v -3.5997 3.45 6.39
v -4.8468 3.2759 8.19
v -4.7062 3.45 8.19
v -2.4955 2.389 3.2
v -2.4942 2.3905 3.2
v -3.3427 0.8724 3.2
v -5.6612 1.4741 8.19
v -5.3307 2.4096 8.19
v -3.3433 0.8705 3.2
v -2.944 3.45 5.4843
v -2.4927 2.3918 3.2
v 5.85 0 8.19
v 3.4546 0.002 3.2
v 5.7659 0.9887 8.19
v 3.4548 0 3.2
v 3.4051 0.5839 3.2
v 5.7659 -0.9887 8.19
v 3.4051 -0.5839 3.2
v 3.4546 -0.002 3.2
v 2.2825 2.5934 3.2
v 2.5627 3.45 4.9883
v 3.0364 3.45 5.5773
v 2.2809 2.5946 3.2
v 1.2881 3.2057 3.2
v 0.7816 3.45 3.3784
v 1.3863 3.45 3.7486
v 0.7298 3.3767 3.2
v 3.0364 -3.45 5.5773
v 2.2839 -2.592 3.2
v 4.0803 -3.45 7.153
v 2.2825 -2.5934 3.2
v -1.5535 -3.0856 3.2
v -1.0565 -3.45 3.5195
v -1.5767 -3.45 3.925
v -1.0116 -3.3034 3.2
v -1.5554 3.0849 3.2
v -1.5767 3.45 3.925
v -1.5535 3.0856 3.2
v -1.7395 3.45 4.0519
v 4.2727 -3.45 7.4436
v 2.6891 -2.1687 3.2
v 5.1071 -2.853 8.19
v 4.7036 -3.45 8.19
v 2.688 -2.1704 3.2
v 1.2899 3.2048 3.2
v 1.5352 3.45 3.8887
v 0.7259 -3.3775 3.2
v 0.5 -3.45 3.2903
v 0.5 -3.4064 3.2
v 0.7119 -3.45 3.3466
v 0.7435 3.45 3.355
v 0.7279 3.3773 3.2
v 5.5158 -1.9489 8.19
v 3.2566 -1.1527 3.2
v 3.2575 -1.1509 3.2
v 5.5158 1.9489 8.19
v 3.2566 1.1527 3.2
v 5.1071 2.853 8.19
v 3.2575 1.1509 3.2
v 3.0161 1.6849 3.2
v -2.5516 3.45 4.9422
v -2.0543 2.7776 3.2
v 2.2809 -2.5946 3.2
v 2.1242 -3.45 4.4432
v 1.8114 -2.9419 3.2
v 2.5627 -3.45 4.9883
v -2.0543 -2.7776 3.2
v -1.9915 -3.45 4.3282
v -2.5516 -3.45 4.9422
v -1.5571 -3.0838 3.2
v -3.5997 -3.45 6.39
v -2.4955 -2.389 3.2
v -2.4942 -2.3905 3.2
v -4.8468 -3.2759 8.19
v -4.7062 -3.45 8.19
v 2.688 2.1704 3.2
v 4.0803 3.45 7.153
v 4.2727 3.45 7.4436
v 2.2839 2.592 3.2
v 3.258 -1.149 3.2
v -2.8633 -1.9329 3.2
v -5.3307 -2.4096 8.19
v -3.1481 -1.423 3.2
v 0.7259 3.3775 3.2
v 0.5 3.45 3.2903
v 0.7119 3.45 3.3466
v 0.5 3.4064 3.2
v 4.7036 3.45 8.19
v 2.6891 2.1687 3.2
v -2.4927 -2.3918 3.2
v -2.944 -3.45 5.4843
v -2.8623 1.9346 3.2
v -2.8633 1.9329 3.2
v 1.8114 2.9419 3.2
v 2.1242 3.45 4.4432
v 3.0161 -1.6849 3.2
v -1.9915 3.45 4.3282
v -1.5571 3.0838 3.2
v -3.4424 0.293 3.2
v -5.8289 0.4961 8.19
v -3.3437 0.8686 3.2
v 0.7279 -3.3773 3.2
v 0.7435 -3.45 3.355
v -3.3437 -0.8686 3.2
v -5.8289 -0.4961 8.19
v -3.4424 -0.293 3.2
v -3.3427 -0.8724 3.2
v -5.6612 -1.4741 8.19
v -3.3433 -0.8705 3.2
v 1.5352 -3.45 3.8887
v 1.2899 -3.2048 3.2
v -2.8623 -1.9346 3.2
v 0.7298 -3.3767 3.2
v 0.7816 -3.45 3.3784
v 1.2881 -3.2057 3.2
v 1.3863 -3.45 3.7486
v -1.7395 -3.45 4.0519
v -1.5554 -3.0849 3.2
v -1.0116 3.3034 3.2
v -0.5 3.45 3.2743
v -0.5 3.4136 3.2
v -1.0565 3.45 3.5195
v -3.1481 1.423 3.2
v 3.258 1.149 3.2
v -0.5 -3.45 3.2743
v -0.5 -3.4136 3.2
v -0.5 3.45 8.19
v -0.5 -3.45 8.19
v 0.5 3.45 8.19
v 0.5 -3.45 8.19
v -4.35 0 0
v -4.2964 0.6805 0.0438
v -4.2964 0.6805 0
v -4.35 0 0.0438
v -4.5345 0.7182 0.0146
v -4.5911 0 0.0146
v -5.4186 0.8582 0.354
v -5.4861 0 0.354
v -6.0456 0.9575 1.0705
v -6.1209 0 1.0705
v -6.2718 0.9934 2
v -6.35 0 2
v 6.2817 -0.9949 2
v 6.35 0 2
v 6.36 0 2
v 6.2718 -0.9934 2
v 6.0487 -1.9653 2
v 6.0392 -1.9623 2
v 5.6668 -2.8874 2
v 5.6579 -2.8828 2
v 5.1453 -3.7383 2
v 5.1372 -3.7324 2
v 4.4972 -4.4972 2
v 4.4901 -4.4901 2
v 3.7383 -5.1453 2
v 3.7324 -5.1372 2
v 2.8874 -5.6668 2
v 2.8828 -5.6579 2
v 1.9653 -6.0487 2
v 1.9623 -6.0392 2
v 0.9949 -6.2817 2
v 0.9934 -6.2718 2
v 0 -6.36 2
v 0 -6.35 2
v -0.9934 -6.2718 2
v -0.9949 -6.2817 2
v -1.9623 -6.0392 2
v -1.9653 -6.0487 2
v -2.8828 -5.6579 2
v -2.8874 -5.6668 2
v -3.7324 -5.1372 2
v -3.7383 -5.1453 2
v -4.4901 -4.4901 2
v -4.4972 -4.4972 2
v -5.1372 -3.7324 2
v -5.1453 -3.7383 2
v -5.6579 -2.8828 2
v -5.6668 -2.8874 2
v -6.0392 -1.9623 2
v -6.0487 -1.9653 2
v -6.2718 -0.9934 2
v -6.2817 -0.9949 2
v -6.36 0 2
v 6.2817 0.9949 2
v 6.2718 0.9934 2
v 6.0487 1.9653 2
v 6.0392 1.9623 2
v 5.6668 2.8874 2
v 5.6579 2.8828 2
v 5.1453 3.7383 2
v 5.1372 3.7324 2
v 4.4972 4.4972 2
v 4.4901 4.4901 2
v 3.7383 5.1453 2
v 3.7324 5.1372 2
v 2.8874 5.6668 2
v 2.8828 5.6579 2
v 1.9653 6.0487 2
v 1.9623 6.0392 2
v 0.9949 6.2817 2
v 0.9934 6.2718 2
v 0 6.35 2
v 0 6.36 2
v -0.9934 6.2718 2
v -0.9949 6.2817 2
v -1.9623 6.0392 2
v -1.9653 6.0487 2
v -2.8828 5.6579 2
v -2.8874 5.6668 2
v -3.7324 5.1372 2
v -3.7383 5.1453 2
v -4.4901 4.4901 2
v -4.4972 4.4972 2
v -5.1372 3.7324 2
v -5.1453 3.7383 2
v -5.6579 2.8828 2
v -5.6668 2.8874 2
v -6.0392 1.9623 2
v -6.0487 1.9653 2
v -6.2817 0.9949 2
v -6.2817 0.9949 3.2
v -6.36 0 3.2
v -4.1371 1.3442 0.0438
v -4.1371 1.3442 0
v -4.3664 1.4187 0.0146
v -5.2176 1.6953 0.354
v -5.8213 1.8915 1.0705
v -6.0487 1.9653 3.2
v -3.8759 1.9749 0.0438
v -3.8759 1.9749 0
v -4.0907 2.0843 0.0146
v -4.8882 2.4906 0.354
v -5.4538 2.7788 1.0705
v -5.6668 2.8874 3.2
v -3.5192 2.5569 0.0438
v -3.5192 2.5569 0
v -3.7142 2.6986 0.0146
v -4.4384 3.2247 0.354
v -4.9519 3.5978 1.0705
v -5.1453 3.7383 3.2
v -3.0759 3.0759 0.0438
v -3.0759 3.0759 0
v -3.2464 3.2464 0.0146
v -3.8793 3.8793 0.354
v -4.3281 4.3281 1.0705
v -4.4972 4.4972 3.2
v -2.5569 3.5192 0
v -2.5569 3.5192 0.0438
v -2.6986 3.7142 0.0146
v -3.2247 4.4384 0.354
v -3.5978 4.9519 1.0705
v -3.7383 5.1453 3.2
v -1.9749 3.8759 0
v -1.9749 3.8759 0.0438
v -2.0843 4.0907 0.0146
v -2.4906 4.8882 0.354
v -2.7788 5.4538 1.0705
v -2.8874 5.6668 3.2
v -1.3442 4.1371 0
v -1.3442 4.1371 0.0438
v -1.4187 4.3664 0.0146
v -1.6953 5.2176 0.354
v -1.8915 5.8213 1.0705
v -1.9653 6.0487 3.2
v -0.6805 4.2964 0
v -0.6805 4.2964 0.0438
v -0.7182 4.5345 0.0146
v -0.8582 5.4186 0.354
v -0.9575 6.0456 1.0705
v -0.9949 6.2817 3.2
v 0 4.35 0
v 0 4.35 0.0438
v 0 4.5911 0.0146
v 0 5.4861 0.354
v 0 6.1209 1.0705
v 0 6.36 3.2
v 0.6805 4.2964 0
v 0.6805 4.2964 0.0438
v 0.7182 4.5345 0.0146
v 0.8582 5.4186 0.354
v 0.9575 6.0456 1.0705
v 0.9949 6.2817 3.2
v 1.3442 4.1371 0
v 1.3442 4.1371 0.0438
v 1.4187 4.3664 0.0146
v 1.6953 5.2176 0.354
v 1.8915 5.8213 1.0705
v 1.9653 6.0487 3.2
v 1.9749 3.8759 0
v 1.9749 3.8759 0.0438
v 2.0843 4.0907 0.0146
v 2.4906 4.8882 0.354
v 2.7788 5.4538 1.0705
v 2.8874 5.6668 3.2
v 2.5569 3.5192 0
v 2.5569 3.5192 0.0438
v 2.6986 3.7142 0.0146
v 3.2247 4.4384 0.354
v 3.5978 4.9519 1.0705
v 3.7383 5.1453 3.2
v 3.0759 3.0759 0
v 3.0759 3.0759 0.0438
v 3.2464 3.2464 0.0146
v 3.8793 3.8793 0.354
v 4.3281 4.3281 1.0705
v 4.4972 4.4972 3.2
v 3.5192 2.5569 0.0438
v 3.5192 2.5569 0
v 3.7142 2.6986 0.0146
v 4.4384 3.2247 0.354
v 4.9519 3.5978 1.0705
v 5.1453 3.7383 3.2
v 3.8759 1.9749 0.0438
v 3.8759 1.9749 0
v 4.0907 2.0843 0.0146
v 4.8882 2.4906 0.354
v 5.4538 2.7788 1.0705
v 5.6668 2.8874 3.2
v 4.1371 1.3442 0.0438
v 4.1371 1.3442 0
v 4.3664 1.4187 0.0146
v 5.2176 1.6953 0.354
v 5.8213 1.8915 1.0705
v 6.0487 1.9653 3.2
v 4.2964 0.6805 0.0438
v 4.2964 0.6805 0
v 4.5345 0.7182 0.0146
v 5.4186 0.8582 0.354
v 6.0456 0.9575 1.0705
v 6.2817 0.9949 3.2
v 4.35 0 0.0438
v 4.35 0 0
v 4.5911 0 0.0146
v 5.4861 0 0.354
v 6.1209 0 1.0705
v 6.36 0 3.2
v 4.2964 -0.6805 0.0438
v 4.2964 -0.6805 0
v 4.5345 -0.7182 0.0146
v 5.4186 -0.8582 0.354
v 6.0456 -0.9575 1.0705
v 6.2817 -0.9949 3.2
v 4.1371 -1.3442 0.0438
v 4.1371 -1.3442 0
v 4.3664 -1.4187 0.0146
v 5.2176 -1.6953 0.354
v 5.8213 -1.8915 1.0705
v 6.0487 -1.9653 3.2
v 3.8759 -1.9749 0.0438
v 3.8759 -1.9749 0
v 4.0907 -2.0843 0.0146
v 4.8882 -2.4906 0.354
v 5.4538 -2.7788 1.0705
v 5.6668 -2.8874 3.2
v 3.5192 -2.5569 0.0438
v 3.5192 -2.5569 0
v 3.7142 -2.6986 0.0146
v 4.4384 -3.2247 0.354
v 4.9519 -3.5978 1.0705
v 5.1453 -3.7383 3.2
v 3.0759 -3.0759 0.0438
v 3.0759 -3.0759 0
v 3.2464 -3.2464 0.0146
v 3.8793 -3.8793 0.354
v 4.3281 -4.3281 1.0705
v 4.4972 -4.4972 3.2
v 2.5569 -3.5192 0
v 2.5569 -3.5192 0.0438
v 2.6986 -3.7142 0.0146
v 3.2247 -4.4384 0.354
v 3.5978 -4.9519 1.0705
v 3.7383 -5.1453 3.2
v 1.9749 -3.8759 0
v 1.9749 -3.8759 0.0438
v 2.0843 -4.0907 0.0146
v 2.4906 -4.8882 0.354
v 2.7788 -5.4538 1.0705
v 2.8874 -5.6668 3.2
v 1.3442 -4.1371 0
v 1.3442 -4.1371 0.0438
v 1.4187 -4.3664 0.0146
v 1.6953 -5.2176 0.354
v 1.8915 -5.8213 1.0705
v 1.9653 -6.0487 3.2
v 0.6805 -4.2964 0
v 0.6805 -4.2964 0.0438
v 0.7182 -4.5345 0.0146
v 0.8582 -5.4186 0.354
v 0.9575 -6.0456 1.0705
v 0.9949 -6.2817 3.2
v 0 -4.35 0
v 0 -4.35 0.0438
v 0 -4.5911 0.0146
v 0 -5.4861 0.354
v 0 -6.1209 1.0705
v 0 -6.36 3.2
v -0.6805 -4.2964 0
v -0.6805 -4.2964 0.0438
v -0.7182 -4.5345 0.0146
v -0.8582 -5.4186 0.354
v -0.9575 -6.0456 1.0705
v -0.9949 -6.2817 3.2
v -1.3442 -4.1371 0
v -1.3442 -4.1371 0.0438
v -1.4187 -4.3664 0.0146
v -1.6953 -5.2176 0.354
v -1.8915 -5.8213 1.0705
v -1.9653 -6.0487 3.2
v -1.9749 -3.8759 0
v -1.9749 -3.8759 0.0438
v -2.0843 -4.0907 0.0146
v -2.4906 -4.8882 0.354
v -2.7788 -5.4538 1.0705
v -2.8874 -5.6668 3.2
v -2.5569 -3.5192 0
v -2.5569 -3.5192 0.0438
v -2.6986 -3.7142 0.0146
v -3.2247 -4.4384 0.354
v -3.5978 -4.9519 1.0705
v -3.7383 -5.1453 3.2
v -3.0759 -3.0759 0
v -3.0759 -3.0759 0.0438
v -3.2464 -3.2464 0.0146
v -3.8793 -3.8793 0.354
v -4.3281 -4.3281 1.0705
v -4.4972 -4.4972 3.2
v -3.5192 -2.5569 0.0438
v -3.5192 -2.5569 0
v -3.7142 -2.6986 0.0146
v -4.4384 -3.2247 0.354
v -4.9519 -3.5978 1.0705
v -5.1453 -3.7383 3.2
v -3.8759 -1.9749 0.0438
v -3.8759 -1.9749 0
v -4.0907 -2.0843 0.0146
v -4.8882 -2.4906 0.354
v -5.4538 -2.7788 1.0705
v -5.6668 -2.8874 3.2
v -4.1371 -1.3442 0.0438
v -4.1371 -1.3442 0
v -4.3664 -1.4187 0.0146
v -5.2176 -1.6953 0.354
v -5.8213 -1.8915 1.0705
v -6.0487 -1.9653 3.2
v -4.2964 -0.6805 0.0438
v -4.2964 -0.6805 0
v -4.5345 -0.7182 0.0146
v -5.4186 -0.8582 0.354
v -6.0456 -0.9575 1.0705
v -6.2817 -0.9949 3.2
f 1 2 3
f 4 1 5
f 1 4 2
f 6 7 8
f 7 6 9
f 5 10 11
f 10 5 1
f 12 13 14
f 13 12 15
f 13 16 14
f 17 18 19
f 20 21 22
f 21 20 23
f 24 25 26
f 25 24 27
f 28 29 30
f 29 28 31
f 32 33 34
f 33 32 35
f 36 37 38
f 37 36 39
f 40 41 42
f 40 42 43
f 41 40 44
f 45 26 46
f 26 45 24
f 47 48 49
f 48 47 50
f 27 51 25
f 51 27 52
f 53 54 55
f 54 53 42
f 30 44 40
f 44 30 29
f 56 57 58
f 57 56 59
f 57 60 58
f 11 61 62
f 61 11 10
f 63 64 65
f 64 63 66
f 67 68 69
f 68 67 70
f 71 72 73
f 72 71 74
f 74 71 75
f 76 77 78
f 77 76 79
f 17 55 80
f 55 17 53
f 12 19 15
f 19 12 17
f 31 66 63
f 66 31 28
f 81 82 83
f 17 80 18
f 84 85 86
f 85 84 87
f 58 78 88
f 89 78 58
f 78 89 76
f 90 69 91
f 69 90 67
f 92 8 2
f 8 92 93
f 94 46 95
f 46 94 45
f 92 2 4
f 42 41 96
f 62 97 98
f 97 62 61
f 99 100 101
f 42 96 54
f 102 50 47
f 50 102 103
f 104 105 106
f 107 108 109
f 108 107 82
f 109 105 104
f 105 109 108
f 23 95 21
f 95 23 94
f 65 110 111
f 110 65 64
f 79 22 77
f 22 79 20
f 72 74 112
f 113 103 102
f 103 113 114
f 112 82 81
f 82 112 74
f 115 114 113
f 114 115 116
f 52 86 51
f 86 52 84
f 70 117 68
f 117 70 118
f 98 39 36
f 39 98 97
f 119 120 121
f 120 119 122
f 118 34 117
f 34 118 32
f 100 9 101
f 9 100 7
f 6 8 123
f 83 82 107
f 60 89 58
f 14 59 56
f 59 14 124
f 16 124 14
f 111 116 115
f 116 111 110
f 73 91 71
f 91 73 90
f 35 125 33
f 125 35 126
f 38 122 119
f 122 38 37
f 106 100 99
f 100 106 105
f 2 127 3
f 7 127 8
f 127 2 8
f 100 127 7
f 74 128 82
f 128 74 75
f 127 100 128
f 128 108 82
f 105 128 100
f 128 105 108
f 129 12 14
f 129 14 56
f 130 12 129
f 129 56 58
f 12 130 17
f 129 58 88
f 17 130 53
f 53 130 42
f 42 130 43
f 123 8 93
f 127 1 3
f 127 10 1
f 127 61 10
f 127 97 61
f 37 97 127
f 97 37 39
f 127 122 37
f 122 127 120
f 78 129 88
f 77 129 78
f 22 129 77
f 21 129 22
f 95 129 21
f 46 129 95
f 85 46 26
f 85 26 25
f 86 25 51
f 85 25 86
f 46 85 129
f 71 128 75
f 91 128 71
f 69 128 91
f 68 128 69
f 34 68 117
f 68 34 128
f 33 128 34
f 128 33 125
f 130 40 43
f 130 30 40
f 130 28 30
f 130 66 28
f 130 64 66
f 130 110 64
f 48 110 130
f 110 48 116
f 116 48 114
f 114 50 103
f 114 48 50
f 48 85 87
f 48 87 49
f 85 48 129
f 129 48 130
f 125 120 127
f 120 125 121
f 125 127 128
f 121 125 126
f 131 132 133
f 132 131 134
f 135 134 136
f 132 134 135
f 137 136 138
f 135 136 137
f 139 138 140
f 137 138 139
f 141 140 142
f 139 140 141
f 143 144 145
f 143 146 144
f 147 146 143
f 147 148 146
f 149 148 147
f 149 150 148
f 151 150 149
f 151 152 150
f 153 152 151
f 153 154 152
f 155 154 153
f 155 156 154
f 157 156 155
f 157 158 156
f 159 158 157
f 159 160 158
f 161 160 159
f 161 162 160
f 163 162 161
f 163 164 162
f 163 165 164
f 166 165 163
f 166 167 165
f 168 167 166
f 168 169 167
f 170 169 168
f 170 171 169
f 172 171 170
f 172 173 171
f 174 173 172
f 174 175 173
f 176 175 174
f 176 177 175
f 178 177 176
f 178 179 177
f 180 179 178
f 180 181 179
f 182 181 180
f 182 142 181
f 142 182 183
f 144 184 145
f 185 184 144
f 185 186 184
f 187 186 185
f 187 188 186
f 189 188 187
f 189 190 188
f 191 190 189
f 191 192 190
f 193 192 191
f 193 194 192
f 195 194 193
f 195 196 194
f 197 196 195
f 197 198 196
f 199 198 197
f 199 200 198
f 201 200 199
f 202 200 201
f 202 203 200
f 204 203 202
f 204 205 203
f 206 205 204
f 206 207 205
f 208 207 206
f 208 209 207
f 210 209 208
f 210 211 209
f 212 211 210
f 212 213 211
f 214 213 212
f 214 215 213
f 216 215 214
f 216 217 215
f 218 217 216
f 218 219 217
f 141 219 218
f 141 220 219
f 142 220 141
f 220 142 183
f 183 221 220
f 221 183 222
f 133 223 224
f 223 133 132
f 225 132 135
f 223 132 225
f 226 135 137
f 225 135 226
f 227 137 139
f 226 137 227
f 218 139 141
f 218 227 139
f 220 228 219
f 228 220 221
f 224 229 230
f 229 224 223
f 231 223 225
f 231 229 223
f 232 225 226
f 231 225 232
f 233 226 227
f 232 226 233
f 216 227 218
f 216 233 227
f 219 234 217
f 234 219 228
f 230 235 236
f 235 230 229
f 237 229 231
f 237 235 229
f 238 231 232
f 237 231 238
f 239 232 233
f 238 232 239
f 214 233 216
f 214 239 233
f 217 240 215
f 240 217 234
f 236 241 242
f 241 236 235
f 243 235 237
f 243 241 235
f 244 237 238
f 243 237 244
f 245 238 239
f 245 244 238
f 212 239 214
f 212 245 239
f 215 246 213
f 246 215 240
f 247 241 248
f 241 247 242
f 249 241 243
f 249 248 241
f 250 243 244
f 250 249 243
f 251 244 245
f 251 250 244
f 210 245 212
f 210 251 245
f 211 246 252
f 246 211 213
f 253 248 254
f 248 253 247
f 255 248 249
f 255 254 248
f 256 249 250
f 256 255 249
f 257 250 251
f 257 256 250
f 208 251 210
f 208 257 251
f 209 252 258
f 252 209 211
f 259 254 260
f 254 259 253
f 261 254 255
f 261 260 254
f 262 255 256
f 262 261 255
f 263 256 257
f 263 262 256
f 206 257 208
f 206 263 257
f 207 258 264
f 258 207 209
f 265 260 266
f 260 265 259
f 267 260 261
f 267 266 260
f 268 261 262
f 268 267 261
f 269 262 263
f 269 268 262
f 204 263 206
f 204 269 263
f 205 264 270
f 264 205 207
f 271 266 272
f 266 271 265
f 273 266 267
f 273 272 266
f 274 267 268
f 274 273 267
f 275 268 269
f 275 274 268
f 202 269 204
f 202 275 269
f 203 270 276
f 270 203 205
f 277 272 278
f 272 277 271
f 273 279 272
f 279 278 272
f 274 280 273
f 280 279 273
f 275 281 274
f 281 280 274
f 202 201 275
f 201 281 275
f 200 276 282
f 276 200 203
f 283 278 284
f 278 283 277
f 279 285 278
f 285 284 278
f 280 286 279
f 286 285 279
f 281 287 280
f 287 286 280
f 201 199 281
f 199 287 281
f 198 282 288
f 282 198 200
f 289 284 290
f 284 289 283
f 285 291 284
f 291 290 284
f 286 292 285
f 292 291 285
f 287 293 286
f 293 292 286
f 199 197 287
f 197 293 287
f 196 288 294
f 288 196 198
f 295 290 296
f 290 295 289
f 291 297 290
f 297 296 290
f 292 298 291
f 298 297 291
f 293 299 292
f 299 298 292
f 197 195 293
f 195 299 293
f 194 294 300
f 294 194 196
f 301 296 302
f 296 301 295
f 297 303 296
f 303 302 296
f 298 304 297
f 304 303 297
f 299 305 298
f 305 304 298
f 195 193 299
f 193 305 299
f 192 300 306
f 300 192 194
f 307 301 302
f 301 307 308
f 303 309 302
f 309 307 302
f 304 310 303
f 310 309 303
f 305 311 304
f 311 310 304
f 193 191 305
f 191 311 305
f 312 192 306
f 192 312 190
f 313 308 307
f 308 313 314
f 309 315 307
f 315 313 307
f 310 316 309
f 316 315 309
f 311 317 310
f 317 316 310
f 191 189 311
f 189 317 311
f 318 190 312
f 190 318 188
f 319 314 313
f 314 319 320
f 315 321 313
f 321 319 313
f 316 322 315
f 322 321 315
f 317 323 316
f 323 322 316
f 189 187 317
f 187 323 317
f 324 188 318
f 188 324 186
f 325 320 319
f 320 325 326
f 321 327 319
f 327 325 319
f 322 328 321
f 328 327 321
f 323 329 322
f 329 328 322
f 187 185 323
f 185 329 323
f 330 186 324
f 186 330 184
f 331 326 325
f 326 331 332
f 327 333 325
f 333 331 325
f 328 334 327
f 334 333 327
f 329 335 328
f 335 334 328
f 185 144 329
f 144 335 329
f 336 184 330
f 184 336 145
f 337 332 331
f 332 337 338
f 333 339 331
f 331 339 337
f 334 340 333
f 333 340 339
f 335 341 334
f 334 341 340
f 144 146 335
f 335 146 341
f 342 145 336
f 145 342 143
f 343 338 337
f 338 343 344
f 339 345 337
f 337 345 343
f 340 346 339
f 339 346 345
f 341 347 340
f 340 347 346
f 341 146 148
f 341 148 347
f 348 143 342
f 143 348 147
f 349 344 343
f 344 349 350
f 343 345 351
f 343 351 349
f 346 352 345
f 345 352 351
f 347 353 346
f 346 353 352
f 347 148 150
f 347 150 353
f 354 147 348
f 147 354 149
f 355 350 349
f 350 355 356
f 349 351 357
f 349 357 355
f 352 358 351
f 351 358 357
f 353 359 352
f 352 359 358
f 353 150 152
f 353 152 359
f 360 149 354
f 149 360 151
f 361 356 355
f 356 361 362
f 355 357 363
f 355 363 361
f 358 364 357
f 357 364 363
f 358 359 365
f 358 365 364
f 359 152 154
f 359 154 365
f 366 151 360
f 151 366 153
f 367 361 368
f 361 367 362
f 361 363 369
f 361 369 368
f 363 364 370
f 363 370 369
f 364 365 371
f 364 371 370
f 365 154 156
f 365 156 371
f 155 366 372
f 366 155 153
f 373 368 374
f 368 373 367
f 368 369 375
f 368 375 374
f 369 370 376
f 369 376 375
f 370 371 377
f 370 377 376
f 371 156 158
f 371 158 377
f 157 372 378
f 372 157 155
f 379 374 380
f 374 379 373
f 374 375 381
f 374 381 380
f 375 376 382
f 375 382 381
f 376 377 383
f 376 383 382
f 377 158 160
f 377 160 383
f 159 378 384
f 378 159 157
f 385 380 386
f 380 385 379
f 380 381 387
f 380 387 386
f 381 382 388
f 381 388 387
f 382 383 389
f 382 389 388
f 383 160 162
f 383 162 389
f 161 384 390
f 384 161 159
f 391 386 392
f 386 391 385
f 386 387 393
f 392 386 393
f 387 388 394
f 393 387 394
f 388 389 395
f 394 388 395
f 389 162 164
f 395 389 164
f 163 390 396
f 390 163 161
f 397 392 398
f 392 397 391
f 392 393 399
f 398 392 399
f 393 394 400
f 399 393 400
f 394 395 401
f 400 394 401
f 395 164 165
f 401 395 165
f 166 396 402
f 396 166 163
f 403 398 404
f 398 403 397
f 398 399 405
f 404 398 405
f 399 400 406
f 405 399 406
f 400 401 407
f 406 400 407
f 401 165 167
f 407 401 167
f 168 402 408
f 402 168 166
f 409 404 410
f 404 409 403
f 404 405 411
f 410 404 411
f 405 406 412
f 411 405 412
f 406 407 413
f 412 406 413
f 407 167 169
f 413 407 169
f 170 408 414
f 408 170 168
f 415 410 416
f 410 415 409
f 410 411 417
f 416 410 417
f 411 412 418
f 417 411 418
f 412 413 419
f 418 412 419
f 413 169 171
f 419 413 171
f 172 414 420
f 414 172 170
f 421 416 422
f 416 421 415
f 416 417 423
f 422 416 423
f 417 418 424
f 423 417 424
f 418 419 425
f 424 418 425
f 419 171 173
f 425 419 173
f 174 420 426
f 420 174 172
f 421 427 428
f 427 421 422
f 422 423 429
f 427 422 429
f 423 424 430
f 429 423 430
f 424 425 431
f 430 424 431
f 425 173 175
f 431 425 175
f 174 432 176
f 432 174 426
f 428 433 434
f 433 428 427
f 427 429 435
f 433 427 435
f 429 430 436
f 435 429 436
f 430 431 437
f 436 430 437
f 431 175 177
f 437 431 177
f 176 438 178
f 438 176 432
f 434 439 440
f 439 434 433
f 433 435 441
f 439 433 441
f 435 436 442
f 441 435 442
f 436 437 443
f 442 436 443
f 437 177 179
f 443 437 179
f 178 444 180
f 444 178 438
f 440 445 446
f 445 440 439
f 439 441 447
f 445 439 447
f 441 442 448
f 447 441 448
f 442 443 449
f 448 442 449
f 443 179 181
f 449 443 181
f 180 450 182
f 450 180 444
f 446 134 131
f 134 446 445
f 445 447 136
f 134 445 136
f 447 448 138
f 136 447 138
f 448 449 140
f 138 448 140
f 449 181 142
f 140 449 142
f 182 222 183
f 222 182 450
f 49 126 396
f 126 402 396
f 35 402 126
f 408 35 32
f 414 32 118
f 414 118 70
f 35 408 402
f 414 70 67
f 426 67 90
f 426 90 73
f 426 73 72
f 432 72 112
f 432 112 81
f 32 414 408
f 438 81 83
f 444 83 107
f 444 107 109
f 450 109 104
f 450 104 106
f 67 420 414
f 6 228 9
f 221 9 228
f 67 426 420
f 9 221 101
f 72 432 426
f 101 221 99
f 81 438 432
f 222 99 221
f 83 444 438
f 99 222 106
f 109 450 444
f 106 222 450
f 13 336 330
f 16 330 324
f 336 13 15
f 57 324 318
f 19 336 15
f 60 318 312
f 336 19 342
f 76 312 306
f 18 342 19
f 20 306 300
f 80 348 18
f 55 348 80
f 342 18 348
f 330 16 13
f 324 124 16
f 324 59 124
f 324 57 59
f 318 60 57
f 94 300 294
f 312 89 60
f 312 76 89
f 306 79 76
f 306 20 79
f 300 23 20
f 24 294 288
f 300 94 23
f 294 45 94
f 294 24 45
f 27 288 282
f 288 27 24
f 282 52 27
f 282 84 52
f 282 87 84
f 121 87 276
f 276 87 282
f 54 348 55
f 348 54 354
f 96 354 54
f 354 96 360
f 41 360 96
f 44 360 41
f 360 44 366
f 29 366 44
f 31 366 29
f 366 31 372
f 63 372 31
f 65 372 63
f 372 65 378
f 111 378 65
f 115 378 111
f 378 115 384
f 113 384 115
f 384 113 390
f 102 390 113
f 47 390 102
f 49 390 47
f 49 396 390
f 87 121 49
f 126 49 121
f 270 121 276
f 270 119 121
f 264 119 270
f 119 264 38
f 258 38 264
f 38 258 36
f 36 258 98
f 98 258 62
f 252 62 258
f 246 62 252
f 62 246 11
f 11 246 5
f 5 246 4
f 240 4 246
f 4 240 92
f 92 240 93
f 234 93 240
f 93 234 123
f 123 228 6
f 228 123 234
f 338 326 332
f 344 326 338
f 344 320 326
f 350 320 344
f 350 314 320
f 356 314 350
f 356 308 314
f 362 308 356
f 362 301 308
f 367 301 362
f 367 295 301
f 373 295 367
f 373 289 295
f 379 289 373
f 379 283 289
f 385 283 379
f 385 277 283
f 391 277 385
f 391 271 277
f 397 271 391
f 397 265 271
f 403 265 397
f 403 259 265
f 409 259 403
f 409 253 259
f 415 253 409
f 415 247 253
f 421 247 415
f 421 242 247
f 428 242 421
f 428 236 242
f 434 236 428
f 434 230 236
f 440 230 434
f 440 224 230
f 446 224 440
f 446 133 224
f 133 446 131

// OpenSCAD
// -*- mode: SCAD ; c-file-style: "ellemtel" ; coding: utf-8 -*-
//
// NN
//
// Copyright 2018 - 2019 Roland Sieker <ospalh@gmail.com>
// Licence: CC-BY-SA 4.0

/* [Global] */


// Set this to “render” and click on “Create Thing” when done with the setup.
preview = 1; // [0:render, 1:preview]

/* [Sizes] */

// Outer diameter of tube (mm)
diameter = 12.7;  // [5:0.1:40]

// Thickness of the tube wall
wall = 0.9;   // [0.4:0.1:5]

/* [Hidden] */

// Done with the customizer

// *******************************************************
// Extra parameters. These can be changed reasonably safely.


// w = 1.8;  // Wall width
p = 1.2;  // Bottom, top plate hight
c = 0.4;  // Clearance

gap = 1;  // The central gap for the two plug/clamp arms
cgap = 2; // Cylinder gap
r_r = 2;  // Rounding radius. Reduce this for tubes < ~ 5mm
h_p = 5;  // hight of the plug bit

// *******************************************************
// Some shortcuts. These shouldn’t be changed

tau = 2 * PI;  // π is still wrong. τ = circumference / r



some_distance = 50;
ms = 0.01;  // Muggeseggele.

r_m = diameter/2;  // main radius
r_red = r_m - r_r;  // reduced radius of the visible cap

r_pm = r_m - wall + c; // main radius of the plug
r_pb = r_m -wall - cgap;

// fn for differently sized objects and fs, fa; all for preview or rendering.
pna = 40;
pnb = 15;
pa = 5;
ps = 1;
rna = 180;
rnb = 30;
ra = 2;
rs = 0.25;
function na() = (preview) ? pna : rna;
function nb() = (preview) ? pnb : rnb;
$fs = (preview) ? ps : rs;
$fa = (preview) ? pa : ra;

// *******************************************************
// End setup



// *******************************************************
// Generate the parts

endcap();
//2d_vcap();
// %visible_cap();
// #plug();
// ground_plug();

// *******************************************************
// Code for the parts themselves


module endcap()
{
   visible_cap();
   plug();
}


module visible_cap()
{
   rotate_extrude()
   {
      2d_vcap();
   }
}

module 2d_vcap()
{
   square([r_red, r_r]);
   intersection()
   {
      translate([r_red, r_r])
      {
         circle(r_r);
      }
      translate([0,0,-ms])
      {
         square([r_m+ms, r_r+2*ms]);
      }
   }
   translate([0, r_r])
   {
      square([r_m+ms, p]);
   }
}

module plug()
{
   translate([0,0,r_r+p-ms])
   {
      ground_plug();
   }
}


module ground_plug()
{
   difference()
   {
   intersection()
   {
      cylinder(r1=r_pb, r2=r_pm, h=h_p);
      cube([diameter, 2*r_pb, 3*r_m], center=true);
   }
   cube([gap, diameter, 3*r_m], center=true);
   }
}
